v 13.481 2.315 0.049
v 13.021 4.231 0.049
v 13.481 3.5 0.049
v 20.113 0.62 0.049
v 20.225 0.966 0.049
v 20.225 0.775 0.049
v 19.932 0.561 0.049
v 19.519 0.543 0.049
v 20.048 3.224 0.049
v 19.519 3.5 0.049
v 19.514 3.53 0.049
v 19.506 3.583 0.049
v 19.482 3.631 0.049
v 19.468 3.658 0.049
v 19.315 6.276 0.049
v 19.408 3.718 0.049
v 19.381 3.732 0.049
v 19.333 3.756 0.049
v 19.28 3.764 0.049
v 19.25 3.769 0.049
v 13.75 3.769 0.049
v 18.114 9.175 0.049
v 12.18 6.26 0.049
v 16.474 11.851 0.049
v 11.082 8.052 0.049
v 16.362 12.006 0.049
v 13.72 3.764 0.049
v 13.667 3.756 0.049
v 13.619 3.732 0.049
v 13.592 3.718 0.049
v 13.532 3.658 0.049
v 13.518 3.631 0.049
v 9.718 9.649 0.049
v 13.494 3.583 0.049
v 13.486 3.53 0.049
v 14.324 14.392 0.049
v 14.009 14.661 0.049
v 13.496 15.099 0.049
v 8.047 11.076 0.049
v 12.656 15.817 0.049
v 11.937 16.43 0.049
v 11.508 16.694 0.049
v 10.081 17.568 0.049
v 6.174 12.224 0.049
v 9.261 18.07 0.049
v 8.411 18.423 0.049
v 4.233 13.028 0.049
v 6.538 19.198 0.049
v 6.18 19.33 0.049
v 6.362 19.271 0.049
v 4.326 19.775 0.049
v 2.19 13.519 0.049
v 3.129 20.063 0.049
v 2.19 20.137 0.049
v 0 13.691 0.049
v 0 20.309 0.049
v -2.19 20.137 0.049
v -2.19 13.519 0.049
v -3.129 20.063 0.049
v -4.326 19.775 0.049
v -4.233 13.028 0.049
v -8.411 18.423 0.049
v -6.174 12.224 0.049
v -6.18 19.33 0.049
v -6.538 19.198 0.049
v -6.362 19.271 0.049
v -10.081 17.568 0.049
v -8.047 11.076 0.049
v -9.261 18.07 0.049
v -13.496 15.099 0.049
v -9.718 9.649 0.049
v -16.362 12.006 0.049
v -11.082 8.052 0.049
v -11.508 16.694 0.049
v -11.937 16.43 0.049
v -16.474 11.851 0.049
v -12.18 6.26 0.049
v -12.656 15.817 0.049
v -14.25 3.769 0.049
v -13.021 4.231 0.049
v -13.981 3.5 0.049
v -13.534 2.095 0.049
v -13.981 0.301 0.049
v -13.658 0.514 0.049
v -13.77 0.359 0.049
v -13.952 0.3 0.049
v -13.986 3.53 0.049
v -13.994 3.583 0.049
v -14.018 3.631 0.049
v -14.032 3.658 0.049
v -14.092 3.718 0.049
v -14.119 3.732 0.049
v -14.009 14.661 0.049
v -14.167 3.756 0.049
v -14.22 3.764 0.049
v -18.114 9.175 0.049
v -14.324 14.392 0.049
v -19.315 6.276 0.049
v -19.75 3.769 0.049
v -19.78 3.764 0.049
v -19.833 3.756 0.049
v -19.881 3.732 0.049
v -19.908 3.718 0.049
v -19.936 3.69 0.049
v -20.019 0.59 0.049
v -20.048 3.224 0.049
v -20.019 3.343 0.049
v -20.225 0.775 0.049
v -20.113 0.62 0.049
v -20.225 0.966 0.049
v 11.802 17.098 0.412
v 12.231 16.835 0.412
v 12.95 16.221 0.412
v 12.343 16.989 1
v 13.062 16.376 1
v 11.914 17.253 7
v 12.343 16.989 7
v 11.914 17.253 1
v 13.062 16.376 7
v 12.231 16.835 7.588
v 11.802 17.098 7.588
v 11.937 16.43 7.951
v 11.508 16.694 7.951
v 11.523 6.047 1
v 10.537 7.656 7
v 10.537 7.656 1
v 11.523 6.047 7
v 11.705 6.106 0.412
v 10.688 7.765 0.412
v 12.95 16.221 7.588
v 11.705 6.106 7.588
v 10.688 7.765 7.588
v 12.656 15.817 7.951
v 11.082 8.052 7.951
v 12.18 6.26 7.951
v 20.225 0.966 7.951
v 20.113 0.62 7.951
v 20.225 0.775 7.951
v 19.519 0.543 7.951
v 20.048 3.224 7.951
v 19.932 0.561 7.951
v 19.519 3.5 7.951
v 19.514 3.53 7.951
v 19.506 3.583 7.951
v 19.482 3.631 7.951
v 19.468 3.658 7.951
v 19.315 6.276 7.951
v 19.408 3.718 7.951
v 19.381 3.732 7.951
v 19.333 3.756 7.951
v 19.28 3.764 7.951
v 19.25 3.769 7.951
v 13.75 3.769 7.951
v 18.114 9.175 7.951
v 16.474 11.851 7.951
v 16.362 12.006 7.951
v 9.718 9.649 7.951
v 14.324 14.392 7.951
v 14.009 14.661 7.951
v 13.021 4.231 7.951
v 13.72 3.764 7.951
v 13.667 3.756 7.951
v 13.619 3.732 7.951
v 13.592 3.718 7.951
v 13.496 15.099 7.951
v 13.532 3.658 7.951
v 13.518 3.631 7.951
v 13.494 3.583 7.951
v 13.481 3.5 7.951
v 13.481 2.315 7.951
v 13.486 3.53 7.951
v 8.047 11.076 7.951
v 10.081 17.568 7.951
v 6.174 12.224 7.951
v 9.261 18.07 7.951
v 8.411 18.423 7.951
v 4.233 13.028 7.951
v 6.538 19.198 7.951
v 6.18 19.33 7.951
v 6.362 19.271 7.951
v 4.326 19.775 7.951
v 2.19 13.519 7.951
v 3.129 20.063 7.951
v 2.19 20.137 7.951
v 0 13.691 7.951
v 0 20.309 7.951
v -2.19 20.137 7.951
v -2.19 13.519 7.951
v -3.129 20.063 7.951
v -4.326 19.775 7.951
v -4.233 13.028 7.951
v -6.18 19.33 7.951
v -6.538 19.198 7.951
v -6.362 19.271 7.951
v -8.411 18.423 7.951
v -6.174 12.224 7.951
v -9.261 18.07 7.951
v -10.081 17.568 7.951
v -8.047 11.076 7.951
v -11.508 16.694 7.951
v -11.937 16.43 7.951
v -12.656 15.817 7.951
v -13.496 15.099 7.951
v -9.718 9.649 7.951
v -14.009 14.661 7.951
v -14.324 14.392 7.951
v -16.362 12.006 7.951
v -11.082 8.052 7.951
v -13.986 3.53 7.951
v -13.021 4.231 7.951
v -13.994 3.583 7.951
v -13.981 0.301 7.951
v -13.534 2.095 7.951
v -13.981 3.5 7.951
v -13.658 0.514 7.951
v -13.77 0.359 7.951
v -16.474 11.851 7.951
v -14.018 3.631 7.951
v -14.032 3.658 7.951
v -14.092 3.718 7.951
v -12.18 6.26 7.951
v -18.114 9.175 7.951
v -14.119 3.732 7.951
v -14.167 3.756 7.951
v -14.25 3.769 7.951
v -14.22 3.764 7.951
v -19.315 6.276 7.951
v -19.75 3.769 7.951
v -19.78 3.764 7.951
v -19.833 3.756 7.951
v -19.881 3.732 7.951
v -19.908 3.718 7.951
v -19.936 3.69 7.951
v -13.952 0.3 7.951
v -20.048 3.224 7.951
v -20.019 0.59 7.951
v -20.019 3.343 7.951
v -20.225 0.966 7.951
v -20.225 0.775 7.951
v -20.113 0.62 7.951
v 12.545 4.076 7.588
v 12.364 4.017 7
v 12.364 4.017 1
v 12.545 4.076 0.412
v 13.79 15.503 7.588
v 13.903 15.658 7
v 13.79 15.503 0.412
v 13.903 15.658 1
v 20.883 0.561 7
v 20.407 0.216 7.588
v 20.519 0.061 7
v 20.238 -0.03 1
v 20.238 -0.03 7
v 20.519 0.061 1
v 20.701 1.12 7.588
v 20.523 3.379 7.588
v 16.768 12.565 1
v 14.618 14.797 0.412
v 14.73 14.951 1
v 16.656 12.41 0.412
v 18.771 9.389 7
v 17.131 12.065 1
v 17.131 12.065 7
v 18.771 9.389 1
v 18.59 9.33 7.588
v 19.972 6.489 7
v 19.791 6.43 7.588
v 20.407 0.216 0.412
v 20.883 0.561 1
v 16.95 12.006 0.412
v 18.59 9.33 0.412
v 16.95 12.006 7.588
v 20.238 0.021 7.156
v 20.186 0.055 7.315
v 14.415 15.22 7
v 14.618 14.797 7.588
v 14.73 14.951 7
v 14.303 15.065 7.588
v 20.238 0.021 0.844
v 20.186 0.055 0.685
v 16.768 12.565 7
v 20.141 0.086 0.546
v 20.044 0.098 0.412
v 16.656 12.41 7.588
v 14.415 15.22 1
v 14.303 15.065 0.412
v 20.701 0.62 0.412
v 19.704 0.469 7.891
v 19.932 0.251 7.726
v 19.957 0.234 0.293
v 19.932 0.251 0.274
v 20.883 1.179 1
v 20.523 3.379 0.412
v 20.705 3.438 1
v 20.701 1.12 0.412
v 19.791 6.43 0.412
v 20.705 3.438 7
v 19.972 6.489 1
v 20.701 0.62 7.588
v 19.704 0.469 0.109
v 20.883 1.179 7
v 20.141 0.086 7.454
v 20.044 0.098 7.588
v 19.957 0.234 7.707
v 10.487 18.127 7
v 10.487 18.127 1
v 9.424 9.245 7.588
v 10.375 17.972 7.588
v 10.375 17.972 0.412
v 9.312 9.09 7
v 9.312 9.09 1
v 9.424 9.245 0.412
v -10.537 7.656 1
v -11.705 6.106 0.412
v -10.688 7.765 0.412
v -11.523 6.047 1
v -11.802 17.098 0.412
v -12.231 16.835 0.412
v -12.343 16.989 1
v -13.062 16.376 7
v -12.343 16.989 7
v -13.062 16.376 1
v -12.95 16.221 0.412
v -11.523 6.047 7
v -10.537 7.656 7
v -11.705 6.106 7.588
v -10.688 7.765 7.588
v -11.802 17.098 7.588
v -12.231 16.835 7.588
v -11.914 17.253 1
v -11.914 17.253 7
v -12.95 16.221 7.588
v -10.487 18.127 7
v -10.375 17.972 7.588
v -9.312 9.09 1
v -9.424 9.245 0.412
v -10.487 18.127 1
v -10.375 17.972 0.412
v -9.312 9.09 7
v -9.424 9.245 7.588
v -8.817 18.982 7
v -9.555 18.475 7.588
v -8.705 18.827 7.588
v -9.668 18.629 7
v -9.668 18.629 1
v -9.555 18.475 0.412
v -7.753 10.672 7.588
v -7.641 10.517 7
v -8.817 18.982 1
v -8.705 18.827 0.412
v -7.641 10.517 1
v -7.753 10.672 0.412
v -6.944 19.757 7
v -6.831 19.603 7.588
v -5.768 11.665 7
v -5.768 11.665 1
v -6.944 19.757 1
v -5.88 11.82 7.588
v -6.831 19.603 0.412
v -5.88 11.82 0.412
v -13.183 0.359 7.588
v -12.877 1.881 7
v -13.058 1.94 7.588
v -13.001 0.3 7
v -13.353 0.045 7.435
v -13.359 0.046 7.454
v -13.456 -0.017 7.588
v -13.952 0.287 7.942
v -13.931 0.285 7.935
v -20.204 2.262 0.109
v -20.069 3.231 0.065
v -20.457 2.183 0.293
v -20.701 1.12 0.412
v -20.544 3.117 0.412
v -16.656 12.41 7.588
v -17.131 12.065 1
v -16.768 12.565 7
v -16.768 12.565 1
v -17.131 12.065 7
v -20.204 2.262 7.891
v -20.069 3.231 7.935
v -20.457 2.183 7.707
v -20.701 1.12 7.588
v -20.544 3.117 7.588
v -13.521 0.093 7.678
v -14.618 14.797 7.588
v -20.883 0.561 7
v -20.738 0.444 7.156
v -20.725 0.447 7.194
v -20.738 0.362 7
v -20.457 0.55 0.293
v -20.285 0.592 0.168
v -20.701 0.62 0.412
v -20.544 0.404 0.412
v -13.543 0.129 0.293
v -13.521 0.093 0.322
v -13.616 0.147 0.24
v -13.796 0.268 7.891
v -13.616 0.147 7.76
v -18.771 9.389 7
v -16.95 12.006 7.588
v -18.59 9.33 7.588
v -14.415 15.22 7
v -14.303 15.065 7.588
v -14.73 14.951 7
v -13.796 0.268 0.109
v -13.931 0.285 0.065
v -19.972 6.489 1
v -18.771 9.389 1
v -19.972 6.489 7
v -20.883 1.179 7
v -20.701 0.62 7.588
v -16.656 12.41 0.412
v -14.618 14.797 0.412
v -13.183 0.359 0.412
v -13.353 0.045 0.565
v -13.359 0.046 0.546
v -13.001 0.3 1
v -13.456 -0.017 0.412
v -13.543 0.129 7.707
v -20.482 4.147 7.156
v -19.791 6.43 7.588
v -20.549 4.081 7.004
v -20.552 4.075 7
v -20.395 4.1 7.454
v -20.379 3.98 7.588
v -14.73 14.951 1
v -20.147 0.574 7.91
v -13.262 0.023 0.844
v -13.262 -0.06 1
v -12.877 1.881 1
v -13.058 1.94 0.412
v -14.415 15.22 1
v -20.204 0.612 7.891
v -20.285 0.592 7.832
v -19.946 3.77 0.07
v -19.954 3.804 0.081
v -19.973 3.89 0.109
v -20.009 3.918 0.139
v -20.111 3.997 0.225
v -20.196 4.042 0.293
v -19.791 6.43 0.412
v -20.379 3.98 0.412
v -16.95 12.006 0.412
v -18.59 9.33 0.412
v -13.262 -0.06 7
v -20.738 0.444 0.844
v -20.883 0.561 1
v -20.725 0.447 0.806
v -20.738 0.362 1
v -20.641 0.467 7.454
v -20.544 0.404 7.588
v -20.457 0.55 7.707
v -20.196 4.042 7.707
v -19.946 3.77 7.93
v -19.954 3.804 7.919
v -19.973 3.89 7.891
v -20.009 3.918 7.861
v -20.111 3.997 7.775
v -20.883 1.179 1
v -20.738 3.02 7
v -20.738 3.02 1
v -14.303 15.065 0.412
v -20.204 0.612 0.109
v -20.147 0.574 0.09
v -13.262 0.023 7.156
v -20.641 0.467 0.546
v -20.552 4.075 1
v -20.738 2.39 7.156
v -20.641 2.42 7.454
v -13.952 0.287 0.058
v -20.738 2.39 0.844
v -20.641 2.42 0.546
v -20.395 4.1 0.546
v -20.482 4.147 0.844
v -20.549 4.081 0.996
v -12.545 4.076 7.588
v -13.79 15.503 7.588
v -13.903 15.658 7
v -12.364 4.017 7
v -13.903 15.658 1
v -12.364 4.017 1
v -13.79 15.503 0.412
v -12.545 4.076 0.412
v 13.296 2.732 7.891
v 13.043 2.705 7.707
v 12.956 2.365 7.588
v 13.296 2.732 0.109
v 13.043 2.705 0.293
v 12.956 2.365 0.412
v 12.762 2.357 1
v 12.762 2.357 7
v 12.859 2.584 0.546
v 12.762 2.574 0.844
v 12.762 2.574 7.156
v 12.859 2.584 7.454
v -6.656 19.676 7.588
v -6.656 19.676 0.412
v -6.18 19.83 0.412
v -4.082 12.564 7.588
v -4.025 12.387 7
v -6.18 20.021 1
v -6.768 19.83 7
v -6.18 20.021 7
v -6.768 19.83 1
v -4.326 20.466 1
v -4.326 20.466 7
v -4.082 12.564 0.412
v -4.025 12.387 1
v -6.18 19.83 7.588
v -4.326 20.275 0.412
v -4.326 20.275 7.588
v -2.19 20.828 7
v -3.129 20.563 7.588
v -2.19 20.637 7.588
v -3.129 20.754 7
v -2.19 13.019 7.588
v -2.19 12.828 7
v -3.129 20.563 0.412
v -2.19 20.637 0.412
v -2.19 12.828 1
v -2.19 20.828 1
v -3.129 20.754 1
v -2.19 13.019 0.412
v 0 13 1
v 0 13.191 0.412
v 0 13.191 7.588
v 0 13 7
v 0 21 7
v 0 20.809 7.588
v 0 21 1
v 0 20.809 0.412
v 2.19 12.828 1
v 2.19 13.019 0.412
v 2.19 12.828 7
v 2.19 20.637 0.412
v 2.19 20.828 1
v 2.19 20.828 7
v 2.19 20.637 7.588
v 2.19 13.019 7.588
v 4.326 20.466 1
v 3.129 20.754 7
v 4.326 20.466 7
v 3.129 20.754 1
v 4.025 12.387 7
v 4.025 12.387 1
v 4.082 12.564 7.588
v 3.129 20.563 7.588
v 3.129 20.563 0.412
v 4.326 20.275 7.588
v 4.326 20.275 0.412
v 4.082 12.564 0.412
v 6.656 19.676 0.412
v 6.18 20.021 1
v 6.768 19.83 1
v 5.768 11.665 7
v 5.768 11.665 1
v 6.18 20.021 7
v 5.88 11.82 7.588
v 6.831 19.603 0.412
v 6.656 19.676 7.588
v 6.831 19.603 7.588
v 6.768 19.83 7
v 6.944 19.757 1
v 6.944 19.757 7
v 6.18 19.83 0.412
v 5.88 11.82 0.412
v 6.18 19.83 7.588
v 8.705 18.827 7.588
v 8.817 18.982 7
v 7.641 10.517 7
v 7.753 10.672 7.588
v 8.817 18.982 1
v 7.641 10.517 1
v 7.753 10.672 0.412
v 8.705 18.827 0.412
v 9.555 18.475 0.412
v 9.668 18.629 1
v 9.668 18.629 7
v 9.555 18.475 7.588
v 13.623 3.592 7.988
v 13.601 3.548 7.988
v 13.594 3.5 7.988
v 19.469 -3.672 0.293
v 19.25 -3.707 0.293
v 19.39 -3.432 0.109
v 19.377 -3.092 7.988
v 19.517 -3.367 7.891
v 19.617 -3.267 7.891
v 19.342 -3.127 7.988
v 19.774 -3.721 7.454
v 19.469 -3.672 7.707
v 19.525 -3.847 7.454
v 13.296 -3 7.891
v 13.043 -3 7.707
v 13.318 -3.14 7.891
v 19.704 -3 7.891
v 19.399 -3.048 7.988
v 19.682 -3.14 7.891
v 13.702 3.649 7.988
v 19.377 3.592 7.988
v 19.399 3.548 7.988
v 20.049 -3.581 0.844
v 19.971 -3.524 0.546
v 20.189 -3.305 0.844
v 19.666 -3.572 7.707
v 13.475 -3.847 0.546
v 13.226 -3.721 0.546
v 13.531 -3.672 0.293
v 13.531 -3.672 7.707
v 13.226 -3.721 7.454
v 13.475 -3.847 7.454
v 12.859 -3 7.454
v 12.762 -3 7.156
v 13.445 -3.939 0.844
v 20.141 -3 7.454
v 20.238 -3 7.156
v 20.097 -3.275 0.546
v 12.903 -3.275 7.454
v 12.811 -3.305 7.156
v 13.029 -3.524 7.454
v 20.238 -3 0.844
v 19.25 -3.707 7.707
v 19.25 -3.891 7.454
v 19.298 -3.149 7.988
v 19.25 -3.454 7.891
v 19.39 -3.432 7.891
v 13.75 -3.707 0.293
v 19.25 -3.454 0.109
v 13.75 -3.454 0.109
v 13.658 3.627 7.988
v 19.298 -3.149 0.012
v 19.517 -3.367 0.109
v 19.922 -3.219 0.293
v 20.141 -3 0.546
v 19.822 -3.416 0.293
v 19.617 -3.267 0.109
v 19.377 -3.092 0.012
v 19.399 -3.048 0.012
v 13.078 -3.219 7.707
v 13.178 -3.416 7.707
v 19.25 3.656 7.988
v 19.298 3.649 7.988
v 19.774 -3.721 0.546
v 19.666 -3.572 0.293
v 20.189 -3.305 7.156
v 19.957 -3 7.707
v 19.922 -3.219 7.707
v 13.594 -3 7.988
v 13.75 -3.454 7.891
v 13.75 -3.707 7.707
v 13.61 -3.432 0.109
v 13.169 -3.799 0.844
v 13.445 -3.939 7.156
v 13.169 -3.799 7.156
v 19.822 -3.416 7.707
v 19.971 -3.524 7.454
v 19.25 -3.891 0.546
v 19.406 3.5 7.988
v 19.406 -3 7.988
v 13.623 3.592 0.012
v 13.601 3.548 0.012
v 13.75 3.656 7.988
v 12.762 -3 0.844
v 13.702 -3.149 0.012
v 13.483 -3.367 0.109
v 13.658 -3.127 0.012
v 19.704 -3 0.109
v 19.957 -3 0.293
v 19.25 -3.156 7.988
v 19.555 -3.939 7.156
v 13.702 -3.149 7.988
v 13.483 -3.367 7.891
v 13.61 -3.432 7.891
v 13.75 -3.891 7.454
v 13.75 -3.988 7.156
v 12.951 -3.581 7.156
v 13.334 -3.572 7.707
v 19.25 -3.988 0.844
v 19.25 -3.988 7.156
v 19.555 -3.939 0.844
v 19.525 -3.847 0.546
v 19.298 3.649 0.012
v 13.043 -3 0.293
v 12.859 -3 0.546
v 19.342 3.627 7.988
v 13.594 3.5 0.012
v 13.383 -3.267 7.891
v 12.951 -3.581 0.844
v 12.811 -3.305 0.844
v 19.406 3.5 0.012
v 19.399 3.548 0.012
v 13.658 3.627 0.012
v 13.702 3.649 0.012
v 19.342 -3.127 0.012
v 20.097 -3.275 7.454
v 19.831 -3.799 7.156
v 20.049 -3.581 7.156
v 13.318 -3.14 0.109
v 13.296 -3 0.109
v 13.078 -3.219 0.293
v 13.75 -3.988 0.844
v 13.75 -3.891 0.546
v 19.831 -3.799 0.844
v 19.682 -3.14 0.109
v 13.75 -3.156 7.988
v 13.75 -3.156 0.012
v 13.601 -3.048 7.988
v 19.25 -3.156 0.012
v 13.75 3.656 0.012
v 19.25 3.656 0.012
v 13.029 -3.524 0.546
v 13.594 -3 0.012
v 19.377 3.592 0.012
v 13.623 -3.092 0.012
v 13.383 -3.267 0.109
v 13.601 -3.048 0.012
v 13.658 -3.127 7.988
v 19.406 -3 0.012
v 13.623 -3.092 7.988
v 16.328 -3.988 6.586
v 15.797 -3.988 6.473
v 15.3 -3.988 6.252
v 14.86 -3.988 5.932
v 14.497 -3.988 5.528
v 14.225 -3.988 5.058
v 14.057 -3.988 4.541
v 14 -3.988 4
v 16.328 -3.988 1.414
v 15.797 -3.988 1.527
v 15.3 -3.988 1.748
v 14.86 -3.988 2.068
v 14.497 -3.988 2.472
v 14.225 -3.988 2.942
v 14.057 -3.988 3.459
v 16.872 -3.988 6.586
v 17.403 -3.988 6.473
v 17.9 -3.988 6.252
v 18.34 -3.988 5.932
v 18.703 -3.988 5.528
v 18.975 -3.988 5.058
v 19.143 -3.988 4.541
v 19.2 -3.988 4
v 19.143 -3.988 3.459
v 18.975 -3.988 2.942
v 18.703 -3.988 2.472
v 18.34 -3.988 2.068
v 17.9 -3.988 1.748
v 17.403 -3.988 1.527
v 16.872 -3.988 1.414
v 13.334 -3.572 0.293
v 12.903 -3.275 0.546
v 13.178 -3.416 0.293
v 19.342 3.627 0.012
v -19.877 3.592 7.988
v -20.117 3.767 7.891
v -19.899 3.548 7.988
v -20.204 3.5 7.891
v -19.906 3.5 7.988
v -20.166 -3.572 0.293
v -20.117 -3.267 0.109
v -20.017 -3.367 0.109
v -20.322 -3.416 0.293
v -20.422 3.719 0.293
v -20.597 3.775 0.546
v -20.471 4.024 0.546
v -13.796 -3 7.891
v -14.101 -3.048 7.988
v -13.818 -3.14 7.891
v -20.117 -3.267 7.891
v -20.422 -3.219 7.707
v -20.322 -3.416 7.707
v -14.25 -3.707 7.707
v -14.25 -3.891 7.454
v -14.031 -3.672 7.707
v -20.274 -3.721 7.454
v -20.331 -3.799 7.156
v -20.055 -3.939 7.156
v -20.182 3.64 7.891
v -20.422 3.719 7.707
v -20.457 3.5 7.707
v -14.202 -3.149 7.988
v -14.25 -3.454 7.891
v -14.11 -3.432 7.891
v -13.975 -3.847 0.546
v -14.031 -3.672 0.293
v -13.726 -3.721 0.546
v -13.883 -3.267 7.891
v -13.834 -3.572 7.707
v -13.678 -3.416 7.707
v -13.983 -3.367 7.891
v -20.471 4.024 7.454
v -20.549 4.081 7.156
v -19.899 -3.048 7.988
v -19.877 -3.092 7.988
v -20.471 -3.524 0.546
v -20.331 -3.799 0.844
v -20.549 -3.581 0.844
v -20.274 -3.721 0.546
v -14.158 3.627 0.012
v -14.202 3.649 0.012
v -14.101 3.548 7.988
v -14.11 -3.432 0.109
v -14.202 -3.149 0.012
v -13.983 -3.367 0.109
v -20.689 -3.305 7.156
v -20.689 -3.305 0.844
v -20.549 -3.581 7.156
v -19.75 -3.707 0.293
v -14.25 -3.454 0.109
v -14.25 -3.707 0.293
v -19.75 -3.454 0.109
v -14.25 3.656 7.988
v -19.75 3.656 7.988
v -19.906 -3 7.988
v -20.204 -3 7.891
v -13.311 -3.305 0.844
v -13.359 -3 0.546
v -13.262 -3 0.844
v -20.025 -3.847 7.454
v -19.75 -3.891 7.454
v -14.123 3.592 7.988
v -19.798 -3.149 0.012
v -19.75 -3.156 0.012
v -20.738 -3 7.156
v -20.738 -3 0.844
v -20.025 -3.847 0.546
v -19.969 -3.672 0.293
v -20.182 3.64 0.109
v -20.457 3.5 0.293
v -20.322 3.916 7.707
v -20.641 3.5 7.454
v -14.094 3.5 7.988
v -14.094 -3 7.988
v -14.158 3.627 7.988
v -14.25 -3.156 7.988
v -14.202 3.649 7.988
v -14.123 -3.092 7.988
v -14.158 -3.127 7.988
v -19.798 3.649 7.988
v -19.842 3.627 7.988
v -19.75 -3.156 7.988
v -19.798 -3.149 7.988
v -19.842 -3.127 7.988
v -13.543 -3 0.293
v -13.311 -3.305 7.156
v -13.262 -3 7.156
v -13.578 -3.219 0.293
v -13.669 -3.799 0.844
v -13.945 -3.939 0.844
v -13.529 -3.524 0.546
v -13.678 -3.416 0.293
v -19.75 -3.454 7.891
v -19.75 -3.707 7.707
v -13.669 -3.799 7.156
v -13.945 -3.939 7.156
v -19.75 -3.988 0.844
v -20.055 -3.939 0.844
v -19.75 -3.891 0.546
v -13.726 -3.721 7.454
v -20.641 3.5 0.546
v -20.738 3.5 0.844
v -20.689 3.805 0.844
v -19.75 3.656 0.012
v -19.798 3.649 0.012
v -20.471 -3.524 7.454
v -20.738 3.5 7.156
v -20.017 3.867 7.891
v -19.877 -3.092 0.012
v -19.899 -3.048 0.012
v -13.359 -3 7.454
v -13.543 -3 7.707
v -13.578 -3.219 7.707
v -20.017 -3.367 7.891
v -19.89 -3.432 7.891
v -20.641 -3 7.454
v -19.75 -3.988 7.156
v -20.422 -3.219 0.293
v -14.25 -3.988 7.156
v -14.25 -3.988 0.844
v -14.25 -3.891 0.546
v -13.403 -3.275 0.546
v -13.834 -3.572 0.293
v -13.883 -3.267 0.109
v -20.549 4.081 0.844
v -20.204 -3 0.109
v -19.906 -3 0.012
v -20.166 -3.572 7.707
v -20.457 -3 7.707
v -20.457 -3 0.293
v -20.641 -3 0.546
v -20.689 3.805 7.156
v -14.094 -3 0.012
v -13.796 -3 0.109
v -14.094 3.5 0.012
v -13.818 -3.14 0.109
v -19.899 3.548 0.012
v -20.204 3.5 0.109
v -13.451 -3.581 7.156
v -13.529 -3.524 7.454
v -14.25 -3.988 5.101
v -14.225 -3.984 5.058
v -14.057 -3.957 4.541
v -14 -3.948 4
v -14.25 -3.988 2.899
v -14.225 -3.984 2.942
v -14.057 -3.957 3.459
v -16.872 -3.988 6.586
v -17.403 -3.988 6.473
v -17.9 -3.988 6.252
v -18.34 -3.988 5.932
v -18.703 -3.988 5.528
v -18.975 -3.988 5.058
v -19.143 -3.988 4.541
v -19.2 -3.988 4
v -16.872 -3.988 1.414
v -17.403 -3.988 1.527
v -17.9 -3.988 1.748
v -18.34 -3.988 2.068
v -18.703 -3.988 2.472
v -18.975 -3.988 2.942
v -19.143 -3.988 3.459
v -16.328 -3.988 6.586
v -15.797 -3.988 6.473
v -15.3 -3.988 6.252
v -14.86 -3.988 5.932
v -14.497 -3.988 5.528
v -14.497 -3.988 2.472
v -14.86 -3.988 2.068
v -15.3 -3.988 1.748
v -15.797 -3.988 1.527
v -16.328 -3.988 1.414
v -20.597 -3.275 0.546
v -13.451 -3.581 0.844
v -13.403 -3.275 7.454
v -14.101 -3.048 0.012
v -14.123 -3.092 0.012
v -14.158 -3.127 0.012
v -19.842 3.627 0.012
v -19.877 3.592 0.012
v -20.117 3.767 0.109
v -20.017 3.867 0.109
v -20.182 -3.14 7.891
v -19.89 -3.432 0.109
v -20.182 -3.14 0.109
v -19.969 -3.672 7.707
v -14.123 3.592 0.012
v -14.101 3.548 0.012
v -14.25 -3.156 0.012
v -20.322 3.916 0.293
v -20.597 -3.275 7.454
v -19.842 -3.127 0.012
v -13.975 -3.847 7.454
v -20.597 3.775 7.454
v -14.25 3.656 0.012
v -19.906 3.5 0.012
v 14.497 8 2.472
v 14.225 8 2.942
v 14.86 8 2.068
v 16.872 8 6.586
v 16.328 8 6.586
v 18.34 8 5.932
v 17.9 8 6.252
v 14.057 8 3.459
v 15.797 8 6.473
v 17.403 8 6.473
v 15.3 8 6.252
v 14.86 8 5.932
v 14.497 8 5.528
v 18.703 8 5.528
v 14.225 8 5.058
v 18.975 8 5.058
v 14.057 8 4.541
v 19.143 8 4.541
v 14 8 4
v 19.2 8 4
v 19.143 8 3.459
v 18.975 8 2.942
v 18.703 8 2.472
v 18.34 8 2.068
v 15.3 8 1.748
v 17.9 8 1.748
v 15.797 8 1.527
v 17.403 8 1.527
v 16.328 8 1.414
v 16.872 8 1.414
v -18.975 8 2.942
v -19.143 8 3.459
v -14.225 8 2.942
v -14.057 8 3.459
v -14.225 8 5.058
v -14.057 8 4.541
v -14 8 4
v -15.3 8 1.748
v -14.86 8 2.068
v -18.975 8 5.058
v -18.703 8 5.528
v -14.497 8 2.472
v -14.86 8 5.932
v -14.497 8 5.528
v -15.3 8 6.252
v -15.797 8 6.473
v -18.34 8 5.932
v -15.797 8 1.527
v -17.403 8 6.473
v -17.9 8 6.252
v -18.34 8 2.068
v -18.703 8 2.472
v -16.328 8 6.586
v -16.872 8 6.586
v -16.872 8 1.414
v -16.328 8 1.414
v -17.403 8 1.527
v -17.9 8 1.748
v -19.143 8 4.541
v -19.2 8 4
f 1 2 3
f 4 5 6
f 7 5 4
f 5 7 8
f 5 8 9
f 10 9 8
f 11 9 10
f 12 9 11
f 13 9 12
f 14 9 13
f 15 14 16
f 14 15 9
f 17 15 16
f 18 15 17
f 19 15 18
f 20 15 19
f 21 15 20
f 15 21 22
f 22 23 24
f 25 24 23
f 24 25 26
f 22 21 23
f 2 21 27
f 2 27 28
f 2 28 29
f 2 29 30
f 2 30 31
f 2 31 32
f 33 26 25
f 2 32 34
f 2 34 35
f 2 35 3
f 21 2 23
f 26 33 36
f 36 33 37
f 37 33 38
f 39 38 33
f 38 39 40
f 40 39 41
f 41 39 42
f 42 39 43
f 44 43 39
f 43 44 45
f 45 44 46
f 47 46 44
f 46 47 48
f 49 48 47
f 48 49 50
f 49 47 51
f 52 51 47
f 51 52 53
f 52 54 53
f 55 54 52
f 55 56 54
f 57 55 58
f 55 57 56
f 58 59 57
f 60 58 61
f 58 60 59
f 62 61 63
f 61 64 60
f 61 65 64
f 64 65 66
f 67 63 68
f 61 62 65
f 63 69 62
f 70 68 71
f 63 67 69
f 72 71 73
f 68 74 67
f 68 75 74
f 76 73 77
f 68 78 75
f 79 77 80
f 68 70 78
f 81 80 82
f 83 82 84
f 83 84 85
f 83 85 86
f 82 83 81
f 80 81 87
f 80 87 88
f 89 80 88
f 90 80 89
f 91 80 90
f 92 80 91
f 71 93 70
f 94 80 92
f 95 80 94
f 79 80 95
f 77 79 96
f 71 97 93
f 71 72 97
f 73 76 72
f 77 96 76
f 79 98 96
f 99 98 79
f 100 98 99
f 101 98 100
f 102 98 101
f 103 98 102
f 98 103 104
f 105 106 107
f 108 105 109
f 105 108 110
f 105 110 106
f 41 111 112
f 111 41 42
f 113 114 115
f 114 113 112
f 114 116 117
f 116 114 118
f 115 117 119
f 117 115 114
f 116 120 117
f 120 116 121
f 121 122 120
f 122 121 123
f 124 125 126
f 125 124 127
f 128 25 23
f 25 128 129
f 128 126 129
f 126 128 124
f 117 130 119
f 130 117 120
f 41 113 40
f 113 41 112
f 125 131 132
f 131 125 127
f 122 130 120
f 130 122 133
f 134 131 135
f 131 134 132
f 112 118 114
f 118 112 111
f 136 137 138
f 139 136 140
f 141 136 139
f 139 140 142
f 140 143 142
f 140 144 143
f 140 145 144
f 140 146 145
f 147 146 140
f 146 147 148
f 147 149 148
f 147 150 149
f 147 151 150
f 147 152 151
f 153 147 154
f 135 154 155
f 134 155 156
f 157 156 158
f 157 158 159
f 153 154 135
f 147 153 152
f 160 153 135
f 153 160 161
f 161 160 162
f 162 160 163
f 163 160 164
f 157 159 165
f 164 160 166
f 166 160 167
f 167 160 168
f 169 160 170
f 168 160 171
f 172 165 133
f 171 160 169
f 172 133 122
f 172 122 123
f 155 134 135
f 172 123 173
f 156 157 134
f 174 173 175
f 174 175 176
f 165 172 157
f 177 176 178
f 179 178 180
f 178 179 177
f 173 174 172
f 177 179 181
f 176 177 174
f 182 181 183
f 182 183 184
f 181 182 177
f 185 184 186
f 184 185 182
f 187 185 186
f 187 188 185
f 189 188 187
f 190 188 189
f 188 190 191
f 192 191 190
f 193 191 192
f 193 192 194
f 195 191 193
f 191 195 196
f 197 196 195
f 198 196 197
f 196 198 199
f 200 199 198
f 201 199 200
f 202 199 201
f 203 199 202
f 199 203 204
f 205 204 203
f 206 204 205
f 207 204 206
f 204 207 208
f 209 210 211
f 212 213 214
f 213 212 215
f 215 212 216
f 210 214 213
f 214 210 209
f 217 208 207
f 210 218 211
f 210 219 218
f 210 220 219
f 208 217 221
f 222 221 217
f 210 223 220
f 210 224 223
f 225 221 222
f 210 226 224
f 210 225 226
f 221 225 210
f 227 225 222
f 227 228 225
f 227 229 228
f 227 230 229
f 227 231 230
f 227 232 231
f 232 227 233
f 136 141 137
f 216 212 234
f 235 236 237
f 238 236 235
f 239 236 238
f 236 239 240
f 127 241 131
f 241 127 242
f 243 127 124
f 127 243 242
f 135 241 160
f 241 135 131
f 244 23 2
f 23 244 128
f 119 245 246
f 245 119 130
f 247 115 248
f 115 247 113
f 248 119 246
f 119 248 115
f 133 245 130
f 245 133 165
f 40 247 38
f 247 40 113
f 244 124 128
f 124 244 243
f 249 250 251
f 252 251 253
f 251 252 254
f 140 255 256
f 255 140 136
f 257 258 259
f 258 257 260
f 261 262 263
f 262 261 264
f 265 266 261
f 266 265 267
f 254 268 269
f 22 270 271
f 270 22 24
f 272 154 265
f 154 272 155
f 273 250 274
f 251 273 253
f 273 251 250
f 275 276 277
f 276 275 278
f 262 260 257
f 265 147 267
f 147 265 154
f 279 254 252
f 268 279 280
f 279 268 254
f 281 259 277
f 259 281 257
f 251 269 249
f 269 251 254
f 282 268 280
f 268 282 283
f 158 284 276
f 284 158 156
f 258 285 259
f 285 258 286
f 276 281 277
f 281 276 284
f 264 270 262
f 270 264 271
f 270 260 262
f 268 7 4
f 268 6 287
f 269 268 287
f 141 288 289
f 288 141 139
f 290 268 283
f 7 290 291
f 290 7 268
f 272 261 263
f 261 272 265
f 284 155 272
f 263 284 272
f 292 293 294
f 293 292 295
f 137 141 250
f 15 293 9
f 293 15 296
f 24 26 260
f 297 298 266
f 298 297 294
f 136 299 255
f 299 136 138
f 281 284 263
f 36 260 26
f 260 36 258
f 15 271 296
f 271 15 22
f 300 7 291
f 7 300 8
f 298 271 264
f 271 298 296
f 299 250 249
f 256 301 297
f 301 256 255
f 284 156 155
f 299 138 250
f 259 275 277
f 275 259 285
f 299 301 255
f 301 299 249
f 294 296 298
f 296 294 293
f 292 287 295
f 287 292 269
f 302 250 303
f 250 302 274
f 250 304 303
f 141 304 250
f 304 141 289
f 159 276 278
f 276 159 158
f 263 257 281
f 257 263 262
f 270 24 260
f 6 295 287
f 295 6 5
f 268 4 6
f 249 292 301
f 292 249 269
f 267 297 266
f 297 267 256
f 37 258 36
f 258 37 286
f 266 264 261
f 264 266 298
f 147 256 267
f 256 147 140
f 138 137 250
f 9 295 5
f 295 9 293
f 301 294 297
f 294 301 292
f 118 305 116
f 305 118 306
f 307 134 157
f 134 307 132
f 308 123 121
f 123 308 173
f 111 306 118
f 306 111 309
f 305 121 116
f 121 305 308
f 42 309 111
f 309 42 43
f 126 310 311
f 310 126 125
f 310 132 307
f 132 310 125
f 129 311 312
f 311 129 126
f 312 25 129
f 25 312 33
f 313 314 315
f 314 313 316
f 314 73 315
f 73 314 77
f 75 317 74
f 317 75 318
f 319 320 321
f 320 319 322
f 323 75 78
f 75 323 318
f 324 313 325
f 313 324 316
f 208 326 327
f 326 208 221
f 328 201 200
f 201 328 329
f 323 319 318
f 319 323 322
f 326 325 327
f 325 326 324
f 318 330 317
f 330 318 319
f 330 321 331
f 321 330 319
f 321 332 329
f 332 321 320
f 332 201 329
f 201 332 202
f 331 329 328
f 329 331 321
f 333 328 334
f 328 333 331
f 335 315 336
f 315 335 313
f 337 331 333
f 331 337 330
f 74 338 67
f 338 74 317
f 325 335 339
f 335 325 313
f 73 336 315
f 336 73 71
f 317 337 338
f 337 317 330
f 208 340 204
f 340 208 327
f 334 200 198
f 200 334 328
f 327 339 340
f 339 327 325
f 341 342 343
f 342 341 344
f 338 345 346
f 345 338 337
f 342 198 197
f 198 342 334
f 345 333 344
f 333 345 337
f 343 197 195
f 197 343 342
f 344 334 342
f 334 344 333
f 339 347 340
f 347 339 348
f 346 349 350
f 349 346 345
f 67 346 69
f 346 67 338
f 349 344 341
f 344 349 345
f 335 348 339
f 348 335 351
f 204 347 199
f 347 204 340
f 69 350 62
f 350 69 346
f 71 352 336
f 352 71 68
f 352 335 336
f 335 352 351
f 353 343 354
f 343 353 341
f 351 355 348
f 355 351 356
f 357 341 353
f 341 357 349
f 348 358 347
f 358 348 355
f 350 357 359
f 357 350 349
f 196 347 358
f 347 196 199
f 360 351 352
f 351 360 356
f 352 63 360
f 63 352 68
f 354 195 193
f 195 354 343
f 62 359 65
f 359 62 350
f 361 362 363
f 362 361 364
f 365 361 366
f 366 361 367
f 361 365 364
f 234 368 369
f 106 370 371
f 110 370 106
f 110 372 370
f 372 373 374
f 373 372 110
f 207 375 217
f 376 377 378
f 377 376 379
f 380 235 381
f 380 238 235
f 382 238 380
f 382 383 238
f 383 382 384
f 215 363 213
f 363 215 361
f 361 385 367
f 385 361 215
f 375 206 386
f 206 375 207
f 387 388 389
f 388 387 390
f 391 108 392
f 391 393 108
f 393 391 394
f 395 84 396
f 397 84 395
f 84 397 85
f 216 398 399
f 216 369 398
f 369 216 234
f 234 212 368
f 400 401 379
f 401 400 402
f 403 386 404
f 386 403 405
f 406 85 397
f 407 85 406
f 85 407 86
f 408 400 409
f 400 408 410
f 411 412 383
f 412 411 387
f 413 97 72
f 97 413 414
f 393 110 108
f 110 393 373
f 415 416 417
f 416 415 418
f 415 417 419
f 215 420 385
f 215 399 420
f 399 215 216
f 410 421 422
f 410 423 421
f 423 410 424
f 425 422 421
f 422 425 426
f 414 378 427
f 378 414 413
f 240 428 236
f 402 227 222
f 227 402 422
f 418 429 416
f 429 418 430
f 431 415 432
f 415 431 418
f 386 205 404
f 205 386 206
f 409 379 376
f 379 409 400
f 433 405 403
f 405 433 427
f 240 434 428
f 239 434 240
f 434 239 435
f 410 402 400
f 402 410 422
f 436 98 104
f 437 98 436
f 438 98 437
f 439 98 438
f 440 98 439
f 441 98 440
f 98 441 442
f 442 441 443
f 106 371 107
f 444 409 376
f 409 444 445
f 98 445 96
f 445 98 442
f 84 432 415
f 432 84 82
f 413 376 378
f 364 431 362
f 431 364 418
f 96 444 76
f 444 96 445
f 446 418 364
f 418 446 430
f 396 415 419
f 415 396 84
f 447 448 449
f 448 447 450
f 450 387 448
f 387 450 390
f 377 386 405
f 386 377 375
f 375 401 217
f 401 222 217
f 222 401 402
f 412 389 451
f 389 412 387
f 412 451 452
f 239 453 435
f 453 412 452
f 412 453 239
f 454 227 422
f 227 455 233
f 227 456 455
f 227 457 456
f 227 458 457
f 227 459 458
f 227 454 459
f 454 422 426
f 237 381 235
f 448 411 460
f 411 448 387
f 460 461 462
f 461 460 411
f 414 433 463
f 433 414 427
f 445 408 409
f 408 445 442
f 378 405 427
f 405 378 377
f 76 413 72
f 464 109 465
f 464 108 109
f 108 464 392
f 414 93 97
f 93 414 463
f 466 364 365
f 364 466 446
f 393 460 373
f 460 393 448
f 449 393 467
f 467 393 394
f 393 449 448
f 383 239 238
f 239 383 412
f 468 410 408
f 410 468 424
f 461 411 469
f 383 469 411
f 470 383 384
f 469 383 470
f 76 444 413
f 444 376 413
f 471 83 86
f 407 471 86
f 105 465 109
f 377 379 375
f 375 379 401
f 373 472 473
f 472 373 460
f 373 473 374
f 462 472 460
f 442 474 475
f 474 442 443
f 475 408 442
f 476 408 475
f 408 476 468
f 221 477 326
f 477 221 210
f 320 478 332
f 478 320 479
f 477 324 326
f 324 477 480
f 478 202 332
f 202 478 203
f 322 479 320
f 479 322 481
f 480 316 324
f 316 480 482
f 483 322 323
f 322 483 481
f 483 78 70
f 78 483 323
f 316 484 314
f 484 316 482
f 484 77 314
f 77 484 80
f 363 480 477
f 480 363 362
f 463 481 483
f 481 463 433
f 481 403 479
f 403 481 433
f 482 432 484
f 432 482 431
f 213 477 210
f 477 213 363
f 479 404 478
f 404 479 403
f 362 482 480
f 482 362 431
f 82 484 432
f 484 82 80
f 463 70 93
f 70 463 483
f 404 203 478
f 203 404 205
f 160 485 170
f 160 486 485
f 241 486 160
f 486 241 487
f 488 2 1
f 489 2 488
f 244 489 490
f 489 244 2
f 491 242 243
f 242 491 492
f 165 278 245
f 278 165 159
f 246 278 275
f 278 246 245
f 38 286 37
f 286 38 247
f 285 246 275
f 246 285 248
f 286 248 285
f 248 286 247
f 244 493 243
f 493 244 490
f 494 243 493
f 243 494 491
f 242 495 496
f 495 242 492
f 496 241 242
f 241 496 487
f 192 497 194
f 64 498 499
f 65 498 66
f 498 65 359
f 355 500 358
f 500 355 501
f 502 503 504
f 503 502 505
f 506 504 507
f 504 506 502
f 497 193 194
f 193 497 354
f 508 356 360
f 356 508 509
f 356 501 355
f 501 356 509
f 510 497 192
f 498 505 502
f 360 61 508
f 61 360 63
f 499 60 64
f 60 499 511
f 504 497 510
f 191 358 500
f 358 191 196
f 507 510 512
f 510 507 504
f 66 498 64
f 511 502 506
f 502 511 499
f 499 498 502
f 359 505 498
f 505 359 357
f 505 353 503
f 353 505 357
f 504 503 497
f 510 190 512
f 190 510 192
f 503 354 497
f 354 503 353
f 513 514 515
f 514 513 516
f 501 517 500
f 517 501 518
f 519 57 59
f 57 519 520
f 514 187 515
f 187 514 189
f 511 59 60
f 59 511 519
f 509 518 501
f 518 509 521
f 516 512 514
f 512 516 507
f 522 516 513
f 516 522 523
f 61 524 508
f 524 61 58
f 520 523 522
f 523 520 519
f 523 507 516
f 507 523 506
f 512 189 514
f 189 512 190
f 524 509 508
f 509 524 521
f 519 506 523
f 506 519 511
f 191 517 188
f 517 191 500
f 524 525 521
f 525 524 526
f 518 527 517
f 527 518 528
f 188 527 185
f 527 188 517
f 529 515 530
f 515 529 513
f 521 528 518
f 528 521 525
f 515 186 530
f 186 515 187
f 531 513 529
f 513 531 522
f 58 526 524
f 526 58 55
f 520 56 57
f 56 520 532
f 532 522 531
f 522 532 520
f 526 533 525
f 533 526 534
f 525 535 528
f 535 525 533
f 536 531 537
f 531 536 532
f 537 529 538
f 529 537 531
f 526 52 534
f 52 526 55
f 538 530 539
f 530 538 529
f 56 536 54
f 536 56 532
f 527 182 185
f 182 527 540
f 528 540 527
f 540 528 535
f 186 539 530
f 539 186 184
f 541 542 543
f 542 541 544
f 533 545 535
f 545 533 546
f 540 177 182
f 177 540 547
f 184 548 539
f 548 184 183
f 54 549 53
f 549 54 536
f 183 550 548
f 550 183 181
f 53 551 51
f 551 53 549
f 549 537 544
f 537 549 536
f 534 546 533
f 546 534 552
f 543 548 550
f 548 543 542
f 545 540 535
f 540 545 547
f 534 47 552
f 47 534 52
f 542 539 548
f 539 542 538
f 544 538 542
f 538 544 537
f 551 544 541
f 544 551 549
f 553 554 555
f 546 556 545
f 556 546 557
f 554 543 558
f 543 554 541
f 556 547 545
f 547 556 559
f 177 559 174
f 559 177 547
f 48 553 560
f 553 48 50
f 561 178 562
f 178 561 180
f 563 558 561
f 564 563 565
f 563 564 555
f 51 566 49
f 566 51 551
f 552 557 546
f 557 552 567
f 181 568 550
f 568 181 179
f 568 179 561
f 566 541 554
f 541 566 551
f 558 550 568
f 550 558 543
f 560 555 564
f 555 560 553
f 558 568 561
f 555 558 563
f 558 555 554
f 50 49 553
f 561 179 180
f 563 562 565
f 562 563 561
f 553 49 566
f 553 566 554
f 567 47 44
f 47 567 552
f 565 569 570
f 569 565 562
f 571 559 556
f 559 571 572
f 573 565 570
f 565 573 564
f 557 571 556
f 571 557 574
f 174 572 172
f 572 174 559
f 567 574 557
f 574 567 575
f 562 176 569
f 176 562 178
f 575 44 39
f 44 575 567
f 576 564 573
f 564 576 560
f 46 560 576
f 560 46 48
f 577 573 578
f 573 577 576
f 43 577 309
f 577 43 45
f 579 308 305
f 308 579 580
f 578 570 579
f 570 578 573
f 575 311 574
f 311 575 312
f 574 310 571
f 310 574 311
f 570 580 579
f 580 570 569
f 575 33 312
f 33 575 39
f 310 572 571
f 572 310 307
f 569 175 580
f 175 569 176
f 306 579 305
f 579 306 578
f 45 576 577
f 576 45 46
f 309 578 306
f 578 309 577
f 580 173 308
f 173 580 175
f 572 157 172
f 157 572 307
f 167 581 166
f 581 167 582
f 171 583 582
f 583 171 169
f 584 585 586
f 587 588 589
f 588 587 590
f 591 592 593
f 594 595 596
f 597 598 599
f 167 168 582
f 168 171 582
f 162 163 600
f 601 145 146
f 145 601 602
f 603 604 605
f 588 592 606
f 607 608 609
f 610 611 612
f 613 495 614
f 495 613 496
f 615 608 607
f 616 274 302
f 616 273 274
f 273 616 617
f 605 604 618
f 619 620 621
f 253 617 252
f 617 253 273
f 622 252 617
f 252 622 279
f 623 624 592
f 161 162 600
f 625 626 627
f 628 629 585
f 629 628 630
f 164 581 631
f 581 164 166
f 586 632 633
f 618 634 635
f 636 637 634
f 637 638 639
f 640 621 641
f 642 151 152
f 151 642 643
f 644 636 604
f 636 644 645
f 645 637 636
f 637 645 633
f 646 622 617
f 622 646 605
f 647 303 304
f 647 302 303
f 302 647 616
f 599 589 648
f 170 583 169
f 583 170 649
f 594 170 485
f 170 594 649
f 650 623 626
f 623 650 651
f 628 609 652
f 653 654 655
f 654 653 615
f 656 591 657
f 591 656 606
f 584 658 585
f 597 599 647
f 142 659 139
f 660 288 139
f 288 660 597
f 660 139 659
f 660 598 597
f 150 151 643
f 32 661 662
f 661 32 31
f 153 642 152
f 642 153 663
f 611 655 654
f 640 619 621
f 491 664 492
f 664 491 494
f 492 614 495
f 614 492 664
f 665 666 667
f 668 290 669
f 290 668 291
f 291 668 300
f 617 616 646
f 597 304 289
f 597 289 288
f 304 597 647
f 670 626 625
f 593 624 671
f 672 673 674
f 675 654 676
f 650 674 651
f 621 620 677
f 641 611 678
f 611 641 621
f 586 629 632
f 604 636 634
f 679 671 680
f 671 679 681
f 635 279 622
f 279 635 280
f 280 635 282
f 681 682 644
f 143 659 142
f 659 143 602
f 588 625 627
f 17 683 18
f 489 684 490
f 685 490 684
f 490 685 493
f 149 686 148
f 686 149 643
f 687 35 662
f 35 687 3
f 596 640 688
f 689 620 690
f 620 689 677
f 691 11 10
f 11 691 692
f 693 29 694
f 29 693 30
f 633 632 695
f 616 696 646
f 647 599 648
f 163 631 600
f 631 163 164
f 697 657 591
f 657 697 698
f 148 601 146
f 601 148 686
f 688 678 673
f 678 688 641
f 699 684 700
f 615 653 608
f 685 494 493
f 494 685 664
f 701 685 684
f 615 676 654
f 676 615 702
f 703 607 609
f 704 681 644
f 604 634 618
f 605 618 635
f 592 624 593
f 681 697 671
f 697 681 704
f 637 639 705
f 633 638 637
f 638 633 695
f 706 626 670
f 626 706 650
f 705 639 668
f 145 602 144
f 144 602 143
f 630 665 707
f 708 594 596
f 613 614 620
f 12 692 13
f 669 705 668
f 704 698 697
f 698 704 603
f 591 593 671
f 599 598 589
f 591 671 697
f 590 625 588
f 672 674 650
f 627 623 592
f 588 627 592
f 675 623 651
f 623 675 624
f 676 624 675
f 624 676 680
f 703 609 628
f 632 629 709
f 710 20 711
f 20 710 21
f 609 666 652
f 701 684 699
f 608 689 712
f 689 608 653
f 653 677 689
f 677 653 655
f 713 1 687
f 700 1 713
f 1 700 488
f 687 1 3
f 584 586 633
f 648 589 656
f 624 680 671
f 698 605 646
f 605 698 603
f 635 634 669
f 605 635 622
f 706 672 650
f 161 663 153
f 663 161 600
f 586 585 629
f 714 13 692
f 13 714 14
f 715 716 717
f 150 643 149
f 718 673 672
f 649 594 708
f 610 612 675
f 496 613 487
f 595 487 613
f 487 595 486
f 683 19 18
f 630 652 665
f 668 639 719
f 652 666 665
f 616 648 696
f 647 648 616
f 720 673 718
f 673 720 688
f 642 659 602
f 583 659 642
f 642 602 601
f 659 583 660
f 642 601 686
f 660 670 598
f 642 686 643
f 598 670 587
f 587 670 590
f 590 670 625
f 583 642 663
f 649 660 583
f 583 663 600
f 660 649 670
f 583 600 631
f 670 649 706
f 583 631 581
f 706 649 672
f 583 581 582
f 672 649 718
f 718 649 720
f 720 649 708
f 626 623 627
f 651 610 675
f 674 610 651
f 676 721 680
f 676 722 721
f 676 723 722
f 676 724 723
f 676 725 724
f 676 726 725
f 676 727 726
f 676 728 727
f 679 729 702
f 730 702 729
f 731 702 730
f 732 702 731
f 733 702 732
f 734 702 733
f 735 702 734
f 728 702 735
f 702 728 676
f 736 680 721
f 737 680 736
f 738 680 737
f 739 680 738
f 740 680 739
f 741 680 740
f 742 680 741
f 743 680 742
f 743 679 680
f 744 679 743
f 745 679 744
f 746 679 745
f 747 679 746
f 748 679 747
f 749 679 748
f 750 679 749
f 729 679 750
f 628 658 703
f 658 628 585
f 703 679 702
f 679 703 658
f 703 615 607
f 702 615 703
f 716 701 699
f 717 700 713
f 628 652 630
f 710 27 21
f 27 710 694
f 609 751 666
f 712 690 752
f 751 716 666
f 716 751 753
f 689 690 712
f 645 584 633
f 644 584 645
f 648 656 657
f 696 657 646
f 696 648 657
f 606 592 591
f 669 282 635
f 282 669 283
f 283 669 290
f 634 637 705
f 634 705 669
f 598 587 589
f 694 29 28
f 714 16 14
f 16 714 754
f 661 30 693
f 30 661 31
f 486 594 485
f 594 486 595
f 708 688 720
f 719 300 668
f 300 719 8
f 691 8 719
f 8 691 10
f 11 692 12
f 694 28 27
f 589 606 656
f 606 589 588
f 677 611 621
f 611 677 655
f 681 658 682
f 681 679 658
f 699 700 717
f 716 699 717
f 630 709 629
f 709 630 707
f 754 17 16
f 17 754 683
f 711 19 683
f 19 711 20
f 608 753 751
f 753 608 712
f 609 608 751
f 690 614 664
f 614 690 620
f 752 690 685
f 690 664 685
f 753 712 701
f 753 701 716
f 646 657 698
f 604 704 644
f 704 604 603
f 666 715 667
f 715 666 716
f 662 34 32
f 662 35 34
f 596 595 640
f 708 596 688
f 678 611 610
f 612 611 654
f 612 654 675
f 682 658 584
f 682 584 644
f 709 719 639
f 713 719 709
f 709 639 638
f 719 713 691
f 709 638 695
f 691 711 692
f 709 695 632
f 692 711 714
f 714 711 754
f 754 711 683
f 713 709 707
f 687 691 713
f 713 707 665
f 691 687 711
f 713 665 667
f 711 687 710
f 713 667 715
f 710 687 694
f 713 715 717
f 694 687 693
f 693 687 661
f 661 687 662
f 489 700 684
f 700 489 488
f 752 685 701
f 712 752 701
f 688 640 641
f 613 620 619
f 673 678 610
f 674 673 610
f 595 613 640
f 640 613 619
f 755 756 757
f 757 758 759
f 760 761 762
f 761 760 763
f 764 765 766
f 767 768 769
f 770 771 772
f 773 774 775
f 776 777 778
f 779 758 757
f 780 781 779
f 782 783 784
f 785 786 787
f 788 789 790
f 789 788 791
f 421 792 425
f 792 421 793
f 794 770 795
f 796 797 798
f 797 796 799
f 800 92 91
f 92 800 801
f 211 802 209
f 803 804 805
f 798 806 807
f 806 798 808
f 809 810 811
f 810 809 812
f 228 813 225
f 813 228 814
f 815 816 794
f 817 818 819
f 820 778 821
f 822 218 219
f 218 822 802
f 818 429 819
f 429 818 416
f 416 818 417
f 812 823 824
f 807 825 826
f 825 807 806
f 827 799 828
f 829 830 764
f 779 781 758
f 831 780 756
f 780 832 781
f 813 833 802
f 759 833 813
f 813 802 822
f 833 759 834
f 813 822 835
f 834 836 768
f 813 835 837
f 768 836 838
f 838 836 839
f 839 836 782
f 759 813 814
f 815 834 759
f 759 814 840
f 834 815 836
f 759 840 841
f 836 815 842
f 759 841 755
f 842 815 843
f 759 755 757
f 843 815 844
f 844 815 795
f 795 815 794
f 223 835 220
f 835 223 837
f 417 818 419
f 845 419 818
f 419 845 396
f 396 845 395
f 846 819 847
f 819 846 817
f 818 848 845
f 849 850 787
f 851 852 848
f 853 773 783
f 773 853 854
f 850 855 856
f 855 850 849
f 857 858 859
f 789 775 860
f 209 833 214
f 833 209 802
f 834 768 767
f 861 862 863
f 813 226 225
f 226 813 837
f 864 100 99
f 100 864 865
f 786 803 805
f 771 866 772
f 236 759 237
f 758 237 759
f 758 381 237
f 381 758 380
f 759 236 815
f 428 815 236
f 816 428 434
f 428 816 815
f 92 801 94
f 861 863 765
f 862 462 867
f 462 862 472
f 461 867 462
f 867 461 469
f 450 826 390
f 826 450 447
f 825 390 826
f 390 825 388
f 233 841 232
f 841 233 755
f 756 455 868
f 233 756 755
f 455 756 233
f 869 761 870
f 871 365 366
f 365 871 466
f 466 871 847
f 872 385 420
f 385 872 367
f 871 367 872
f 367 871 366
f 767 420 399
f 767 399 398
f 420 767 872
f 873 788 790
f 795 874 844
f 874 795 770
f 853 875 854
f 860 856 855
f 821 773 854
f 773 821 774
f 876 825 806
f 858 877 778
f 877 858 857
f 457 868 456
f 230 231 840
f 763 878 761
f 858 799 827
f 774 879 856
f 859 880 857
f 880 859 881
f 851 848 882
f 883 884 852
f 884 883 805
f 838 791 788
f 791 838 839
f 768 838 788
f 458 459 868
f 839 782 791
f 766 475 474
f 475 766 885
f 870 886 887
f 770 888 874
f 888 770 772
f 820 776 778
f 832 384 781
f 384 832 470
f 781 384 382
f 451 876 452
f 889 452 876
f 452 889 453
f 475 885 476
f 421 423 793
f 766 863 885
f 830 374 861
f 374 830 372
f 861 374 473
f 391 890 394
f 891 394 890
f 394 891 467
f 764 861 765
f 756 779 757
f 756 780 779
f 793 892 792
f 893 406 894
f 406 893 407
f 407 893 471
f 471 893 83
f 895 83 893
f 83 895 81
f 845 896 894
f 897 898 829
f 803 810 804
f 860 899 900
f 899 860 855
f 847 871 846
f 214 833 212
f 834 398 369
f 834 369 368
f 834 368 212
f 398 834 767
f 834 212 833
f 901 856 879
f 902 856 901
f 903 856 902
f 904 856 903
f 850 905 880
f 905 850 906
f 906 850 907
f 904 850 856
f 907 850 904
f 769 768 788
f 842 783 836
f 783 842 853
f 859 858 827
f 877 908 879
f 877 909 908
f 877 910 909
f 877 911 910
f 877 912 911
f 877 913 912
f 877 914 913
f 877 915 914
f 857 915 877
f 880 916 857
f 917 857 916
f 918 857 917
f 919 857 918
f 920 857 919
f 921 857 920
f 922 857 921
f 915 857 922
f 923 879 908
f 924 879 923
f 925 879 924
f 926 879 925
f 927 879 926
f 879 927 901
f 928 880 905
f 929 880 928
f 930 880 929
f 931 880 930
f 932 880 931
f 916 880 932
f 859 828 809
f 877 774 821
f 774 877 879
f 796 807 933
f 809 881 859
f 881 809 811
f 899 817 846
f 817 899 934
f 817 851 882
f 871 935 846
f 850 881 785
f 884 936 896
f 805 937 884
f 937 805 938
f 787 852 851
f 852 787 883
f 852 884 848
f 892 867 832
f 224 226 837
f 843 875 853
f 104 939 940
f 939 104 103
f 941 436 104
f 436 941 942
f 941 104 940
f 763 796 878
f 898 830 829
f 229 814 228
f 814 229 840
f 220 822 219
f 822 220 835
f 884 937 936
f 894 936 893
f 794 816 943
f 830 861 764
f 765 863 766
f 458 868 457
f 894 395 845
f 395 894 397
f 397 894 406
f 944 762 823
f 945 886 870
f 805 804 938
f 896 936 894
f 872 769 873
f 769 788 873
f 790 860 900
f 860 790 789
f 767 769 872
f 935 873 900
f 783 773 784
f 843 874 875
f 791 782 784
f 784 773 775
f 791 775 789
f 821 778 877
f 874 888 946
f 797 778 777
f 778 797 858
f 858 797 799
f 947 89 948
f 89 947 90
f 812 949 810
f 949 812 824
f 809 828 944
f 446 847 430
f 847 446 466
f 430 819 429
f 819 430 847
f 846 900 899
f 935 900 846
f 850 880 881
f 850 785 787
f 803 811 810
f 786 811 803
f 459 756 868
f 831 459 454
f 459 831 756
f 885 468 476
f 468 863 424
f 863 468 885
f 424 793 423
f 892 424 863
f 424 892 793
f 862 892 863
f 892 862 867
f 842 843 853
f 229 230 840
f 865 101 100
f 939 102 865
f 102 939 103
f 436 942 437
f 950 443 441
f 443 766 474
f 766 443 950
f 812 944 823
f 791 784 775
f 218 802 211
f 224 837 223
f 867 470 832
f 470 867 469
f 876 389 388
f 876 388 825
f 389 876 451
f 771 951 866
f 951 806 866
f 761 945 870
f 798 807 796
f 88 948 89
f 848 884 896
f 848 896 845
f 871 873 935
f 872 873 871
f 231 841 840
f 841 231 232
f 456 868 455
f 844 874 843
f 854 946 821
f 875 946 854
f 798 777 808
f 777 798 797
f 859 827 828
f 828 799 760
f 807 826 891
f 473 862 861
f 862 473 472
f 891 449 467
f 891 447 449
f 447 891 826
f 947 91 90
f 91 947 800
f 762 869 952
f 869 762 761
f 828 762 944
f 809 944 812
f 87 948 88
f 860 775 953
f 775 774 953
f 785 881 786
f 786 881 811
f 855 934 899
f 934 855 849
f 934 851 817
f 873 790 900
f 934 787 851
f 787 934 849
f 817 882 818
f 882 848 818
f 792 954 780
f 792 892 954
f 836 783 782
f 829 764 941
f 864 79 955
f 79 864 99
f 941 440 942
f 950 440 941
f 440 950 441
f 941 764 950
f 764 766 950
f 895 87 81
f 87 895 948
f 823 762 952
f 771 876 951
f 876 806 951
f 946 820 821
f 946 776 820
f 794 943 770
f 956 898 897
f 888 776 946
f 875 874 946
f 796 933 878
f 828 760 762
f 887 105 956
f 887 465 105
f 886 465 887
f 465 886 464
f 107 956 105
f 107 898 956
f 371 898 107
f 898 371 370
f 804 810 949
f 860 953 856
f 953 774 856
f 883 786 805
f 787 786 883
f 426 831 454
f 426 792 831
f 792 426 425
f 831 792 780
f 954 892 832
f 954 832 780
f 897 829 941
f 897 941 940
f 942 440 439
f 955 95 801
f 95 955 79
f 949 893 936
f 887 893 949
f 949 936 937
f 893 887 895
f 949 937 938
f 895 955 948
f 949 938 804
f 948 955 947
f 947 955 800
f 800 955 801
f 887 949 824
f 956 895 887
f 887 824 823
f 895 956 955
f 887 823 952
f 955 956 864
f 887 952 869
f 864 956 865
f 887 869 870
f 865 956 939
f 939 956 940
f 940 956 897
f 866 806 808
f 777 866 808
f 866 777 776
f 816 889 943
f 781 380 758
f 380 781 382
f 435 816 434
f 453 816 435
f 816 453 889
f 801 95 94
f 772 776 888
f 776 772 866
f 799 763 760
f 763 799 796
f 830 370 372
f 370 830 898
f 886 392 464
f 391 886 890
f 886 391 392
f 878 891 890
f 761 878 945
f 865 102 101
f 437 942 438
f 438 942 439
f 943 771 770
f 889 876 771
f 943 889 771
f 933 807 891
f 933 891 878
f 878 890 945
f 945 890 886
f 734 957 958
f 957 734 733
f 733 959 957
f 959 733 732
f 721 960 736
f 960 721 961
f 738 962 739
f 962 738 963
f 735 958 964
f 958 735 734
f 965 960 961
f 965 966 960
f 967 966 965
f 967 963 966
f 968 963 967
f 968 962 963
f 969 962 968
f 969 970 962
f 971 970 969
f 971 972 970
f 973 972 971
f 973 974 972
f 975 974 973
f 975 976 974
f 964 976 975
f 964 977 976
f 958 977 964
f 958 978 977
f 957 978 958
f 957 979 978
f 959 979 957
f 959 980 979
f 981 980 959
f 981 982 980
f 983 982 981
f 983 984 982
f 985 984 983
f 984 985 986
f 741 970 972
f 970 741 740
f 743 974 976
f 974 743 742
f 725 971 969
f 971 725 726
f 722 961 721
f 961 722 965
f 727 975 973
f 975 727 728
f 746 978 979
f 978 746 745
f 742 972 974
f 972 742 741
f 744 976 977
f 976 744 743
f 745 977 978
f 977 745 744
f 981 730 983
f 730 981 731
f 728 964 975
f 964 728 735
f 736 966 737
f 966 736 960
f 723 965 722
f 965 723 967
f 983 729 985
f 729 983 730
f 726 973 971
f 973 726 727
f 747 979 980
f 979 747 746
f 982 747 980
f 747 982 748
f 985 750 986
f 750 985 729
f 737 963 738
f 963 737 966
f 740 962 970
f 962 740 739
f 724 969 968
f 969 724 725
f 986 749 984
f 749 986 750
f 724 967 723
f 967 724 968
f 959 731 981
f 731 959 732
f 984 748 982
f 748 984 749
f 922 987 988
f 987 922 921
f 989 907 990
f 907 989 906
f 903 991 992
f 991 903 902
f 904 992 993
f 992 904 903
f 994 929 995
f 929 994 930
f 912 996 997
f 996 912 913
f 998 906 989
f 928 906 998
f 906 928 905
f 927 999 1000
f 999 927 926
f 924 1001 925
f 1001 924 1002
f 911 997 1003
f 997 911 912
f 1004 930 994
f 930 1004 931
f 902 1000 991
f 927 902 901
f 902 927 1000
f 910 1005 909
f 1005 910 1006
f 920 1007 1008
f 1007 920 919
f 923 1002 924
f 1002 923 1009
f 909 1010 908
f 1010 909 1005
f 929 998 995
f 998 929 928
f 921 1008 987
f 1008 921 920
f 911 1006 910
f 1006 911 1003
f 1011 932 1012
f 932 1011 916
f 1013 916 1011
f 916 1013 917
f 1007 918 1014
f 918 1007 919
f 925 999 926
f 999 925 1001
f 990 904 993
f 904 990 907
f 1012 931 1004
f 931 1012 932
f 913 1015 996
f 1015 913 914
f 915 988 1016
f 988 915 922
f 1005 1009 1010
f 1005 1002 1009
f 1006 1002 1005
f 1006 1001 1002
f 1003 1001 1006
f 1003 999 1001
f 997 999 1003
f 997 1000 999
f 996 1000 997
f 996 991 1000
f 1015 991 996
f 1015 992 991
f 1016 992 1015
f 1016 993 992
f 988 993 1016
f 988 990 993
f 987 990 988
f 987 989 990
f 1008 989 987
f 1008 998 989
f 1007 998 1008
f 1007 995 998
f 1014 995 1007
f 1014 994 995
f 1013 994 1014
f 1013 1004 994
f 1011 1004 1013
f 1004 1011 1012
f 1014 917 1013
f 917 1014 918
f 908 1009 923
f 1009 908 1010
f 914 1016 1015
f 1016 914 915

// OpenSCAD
// file: ../../../../../../../external-resources/geometry/arc/chickenchuck040/arc.scad
// This arc module is from this thing on Thingiverse:
//		https://www.thingiverse.com/thing:1092611

module arc(radius, thick, angle)
{
	intersection()
	{
		union()
		{
			rights = floor(angle/90);
			remain = angle-rights*90;
			if(angle > 90)
			{
				for(i = [0:rights-1]){
					rotate(i*90-(rights-1)*90/2){
						polygon([[0, 0], [radius+thick, (radius+thick)*tan(90/2)], [radius+thick, -(radius+thick)*tan(90/2)]]);
					}
				}
				rotate(-(rights)*90/2)
					polygon([[0, 0], [radius+thick, 0], [radius+thick, -(radius+thick)*tan(remain/2)]]);
				rotate((rights)*90/2)
					polygon([[0, 0], [radius+thick, (radius+thick)*tan(remain/2)], [radius+thick, 0]]);
			}
			else
			{
				polygon([[0, 0], [radius+thick, (radius+thick)*tan(angle/2)], [radius+thick, -(radius+thick)*tan(angle/2)]]);
			}
		}
		difference(){
			circle(radius+thick, $fn = 40);
			circle(radius, $fn = 40);
		}
	}
}

//arc(10, 3, 300);
// file: ../../../../../../../basics/rounded-edges/rounded-cube/rounded-cube.scad
/**
 *
 *  some parts of this software were inspired by
 *
 * 	     http://www.thingiverse.com/thing:9347
 *
 */

/**
 * makes a rounded cube
 */
module roundedCube(cornerRadius=4,
				   cubeCentered=false,
				   sides=30,
				   sidesOnly=false,
				   size=[20,20,2])
{
    $fn=sides;

    x = size[0] - cornerRadius/2;
    y = size[1] - cornerRadius/2;
    z = size[2];

    minkowski()
    {
        cube(size=[x,y,z], center=cubeCentered);

        if(sidesOnly)
        {
            cylinder(r=cornerRadius);
        }
        else
        {
            sphere(r=cornerRadius);
        }
    };
}
// file: ../../../../../../../shapes/geometry/arc/extruded/extruded-arc.scad
use <../../../../external-resources/geometry/arc/chickenchuck040/arc.scad>

module rectangularArc(radius, radiusExtension, angle, height)
{
    linear_extrude(height = height)
    arc(radius = radius,
        thick = radiusExtension,
        angle = angle);
}

module roundedRectangularArc(angle = 111,
                             height = 10,
                             radius = 20, 
                             radiusExtension = 2,
                             minkowskiFn = 10,
                             minkowskiRadius = 1)
{
    minkowski()
    {    
        rectangularArc(angle = angle,
                    height = height,
                    radius = radius,
                    radiusExtension = radiusExtension);

        sphere(r = minkowskiRadius, $fn = minkowskiFn);
    }
}
// file: ../end-cap.scad
use <../../../../../../shapes/geometry/arc/extruded/extruded-arc.scad>

use <../../../../../../basics/rounded-edges/rounded-cube/rounded-cube.scad>

module endCap(showBristlesAttachment = false)
{
    arcHeight = 8;
    arcRadius = 14.0;

    difference()
    {
        union()
        {
            endCapArc(arcHeight = arcHeight,
                    arcRadius = arcRadius);

            pegAttachments(arcRadius = arcRadius,
                        arcHeight = arcHeight);
        }

        cutoutHeight = 19;
        cutoutRadius = 2.6;
        xTranslate = arcRadius + cutoutRadius;
        yTranslate = 8; // the length of the peg sticking out of the bristle attachment
        zTranslate = (arcHeight / 2.0);// + cutoutRadius;
        translate([xTranslate, yTranslate, zTranslate])
        rotate([90, 0, 0])
        cylinder(h = cutoutHeight,
                r = cutoutRadius,
                $fn = 30);

        translate([-xTranslate, yTranslate, zTranslate])
        rotate([90, 0, 0])
        cylinder(h = cutoutHeight,
                r = cutoutRadius,
                $fn = 30);                
    }

    if(showBristlesAttachment)
    {
        xLength = 41;
        yLength = 70;
        
        #
        color("green")
        translate([-xLength/2.0, -yLength, 0])
        cube([xLength, yLength, arcHeight], center = false);
    }
}

module endCapArc(arcHeight, arcRadius)
{
    minkowskiRadius = 1;

    height = arcHeight - (minkowskiRadius * 2);

    color("red")
    translate([0, 0, minkowskiRadius])
    rotate([0, 0, 90])
    roundedRectangularArc(angle = 175,
                        height = height,
                        radius = arcRadius, 
                        radiusExtension = (arcHeight + 4) / 2.0,
                        minkowskiFn = 10,
                        minkowskiRadius = minkowskiRadius);
}

module pegAttachments(arcHeight, arcRadius)
{
    outerRadius = arcHeight / 2.0;

    xTranslate = arcRadius + (outerRadius / 2.0) + 0.75;
    yTranslate = 4;
    zTranslate = outerRadius;

    translate([xTranslate, yTranslate, zTranslate])
    onePegAttachment(outerRadius = outerRadius);

    translate([-xTranslate, yTranslate, zTranslate])
    onePegAttachment(outerRadius = outerRadius);
}

module onePegAttachment(outerRadius)
{
    minkowskiSphereRadius = 0.0;

    cornerRadius = 1;
    xLength = (outerRadius - cornerRadius) * 2.0;
    yLength = 7;
    size = [xLength, yLength, xLength];
    xTranslate = -xLength / 2.0;
    zTranslate = -xLength / 2.0;

    color("blue")
    translate([xTranslate, -yLength, zTranslate])
    roundedCube(cornerRadius = cornerRadius,
                sides=20,
                size=size);    
}
// main file
use <../end-cap.scad>

endCap(showBristlesAttachment = false);
